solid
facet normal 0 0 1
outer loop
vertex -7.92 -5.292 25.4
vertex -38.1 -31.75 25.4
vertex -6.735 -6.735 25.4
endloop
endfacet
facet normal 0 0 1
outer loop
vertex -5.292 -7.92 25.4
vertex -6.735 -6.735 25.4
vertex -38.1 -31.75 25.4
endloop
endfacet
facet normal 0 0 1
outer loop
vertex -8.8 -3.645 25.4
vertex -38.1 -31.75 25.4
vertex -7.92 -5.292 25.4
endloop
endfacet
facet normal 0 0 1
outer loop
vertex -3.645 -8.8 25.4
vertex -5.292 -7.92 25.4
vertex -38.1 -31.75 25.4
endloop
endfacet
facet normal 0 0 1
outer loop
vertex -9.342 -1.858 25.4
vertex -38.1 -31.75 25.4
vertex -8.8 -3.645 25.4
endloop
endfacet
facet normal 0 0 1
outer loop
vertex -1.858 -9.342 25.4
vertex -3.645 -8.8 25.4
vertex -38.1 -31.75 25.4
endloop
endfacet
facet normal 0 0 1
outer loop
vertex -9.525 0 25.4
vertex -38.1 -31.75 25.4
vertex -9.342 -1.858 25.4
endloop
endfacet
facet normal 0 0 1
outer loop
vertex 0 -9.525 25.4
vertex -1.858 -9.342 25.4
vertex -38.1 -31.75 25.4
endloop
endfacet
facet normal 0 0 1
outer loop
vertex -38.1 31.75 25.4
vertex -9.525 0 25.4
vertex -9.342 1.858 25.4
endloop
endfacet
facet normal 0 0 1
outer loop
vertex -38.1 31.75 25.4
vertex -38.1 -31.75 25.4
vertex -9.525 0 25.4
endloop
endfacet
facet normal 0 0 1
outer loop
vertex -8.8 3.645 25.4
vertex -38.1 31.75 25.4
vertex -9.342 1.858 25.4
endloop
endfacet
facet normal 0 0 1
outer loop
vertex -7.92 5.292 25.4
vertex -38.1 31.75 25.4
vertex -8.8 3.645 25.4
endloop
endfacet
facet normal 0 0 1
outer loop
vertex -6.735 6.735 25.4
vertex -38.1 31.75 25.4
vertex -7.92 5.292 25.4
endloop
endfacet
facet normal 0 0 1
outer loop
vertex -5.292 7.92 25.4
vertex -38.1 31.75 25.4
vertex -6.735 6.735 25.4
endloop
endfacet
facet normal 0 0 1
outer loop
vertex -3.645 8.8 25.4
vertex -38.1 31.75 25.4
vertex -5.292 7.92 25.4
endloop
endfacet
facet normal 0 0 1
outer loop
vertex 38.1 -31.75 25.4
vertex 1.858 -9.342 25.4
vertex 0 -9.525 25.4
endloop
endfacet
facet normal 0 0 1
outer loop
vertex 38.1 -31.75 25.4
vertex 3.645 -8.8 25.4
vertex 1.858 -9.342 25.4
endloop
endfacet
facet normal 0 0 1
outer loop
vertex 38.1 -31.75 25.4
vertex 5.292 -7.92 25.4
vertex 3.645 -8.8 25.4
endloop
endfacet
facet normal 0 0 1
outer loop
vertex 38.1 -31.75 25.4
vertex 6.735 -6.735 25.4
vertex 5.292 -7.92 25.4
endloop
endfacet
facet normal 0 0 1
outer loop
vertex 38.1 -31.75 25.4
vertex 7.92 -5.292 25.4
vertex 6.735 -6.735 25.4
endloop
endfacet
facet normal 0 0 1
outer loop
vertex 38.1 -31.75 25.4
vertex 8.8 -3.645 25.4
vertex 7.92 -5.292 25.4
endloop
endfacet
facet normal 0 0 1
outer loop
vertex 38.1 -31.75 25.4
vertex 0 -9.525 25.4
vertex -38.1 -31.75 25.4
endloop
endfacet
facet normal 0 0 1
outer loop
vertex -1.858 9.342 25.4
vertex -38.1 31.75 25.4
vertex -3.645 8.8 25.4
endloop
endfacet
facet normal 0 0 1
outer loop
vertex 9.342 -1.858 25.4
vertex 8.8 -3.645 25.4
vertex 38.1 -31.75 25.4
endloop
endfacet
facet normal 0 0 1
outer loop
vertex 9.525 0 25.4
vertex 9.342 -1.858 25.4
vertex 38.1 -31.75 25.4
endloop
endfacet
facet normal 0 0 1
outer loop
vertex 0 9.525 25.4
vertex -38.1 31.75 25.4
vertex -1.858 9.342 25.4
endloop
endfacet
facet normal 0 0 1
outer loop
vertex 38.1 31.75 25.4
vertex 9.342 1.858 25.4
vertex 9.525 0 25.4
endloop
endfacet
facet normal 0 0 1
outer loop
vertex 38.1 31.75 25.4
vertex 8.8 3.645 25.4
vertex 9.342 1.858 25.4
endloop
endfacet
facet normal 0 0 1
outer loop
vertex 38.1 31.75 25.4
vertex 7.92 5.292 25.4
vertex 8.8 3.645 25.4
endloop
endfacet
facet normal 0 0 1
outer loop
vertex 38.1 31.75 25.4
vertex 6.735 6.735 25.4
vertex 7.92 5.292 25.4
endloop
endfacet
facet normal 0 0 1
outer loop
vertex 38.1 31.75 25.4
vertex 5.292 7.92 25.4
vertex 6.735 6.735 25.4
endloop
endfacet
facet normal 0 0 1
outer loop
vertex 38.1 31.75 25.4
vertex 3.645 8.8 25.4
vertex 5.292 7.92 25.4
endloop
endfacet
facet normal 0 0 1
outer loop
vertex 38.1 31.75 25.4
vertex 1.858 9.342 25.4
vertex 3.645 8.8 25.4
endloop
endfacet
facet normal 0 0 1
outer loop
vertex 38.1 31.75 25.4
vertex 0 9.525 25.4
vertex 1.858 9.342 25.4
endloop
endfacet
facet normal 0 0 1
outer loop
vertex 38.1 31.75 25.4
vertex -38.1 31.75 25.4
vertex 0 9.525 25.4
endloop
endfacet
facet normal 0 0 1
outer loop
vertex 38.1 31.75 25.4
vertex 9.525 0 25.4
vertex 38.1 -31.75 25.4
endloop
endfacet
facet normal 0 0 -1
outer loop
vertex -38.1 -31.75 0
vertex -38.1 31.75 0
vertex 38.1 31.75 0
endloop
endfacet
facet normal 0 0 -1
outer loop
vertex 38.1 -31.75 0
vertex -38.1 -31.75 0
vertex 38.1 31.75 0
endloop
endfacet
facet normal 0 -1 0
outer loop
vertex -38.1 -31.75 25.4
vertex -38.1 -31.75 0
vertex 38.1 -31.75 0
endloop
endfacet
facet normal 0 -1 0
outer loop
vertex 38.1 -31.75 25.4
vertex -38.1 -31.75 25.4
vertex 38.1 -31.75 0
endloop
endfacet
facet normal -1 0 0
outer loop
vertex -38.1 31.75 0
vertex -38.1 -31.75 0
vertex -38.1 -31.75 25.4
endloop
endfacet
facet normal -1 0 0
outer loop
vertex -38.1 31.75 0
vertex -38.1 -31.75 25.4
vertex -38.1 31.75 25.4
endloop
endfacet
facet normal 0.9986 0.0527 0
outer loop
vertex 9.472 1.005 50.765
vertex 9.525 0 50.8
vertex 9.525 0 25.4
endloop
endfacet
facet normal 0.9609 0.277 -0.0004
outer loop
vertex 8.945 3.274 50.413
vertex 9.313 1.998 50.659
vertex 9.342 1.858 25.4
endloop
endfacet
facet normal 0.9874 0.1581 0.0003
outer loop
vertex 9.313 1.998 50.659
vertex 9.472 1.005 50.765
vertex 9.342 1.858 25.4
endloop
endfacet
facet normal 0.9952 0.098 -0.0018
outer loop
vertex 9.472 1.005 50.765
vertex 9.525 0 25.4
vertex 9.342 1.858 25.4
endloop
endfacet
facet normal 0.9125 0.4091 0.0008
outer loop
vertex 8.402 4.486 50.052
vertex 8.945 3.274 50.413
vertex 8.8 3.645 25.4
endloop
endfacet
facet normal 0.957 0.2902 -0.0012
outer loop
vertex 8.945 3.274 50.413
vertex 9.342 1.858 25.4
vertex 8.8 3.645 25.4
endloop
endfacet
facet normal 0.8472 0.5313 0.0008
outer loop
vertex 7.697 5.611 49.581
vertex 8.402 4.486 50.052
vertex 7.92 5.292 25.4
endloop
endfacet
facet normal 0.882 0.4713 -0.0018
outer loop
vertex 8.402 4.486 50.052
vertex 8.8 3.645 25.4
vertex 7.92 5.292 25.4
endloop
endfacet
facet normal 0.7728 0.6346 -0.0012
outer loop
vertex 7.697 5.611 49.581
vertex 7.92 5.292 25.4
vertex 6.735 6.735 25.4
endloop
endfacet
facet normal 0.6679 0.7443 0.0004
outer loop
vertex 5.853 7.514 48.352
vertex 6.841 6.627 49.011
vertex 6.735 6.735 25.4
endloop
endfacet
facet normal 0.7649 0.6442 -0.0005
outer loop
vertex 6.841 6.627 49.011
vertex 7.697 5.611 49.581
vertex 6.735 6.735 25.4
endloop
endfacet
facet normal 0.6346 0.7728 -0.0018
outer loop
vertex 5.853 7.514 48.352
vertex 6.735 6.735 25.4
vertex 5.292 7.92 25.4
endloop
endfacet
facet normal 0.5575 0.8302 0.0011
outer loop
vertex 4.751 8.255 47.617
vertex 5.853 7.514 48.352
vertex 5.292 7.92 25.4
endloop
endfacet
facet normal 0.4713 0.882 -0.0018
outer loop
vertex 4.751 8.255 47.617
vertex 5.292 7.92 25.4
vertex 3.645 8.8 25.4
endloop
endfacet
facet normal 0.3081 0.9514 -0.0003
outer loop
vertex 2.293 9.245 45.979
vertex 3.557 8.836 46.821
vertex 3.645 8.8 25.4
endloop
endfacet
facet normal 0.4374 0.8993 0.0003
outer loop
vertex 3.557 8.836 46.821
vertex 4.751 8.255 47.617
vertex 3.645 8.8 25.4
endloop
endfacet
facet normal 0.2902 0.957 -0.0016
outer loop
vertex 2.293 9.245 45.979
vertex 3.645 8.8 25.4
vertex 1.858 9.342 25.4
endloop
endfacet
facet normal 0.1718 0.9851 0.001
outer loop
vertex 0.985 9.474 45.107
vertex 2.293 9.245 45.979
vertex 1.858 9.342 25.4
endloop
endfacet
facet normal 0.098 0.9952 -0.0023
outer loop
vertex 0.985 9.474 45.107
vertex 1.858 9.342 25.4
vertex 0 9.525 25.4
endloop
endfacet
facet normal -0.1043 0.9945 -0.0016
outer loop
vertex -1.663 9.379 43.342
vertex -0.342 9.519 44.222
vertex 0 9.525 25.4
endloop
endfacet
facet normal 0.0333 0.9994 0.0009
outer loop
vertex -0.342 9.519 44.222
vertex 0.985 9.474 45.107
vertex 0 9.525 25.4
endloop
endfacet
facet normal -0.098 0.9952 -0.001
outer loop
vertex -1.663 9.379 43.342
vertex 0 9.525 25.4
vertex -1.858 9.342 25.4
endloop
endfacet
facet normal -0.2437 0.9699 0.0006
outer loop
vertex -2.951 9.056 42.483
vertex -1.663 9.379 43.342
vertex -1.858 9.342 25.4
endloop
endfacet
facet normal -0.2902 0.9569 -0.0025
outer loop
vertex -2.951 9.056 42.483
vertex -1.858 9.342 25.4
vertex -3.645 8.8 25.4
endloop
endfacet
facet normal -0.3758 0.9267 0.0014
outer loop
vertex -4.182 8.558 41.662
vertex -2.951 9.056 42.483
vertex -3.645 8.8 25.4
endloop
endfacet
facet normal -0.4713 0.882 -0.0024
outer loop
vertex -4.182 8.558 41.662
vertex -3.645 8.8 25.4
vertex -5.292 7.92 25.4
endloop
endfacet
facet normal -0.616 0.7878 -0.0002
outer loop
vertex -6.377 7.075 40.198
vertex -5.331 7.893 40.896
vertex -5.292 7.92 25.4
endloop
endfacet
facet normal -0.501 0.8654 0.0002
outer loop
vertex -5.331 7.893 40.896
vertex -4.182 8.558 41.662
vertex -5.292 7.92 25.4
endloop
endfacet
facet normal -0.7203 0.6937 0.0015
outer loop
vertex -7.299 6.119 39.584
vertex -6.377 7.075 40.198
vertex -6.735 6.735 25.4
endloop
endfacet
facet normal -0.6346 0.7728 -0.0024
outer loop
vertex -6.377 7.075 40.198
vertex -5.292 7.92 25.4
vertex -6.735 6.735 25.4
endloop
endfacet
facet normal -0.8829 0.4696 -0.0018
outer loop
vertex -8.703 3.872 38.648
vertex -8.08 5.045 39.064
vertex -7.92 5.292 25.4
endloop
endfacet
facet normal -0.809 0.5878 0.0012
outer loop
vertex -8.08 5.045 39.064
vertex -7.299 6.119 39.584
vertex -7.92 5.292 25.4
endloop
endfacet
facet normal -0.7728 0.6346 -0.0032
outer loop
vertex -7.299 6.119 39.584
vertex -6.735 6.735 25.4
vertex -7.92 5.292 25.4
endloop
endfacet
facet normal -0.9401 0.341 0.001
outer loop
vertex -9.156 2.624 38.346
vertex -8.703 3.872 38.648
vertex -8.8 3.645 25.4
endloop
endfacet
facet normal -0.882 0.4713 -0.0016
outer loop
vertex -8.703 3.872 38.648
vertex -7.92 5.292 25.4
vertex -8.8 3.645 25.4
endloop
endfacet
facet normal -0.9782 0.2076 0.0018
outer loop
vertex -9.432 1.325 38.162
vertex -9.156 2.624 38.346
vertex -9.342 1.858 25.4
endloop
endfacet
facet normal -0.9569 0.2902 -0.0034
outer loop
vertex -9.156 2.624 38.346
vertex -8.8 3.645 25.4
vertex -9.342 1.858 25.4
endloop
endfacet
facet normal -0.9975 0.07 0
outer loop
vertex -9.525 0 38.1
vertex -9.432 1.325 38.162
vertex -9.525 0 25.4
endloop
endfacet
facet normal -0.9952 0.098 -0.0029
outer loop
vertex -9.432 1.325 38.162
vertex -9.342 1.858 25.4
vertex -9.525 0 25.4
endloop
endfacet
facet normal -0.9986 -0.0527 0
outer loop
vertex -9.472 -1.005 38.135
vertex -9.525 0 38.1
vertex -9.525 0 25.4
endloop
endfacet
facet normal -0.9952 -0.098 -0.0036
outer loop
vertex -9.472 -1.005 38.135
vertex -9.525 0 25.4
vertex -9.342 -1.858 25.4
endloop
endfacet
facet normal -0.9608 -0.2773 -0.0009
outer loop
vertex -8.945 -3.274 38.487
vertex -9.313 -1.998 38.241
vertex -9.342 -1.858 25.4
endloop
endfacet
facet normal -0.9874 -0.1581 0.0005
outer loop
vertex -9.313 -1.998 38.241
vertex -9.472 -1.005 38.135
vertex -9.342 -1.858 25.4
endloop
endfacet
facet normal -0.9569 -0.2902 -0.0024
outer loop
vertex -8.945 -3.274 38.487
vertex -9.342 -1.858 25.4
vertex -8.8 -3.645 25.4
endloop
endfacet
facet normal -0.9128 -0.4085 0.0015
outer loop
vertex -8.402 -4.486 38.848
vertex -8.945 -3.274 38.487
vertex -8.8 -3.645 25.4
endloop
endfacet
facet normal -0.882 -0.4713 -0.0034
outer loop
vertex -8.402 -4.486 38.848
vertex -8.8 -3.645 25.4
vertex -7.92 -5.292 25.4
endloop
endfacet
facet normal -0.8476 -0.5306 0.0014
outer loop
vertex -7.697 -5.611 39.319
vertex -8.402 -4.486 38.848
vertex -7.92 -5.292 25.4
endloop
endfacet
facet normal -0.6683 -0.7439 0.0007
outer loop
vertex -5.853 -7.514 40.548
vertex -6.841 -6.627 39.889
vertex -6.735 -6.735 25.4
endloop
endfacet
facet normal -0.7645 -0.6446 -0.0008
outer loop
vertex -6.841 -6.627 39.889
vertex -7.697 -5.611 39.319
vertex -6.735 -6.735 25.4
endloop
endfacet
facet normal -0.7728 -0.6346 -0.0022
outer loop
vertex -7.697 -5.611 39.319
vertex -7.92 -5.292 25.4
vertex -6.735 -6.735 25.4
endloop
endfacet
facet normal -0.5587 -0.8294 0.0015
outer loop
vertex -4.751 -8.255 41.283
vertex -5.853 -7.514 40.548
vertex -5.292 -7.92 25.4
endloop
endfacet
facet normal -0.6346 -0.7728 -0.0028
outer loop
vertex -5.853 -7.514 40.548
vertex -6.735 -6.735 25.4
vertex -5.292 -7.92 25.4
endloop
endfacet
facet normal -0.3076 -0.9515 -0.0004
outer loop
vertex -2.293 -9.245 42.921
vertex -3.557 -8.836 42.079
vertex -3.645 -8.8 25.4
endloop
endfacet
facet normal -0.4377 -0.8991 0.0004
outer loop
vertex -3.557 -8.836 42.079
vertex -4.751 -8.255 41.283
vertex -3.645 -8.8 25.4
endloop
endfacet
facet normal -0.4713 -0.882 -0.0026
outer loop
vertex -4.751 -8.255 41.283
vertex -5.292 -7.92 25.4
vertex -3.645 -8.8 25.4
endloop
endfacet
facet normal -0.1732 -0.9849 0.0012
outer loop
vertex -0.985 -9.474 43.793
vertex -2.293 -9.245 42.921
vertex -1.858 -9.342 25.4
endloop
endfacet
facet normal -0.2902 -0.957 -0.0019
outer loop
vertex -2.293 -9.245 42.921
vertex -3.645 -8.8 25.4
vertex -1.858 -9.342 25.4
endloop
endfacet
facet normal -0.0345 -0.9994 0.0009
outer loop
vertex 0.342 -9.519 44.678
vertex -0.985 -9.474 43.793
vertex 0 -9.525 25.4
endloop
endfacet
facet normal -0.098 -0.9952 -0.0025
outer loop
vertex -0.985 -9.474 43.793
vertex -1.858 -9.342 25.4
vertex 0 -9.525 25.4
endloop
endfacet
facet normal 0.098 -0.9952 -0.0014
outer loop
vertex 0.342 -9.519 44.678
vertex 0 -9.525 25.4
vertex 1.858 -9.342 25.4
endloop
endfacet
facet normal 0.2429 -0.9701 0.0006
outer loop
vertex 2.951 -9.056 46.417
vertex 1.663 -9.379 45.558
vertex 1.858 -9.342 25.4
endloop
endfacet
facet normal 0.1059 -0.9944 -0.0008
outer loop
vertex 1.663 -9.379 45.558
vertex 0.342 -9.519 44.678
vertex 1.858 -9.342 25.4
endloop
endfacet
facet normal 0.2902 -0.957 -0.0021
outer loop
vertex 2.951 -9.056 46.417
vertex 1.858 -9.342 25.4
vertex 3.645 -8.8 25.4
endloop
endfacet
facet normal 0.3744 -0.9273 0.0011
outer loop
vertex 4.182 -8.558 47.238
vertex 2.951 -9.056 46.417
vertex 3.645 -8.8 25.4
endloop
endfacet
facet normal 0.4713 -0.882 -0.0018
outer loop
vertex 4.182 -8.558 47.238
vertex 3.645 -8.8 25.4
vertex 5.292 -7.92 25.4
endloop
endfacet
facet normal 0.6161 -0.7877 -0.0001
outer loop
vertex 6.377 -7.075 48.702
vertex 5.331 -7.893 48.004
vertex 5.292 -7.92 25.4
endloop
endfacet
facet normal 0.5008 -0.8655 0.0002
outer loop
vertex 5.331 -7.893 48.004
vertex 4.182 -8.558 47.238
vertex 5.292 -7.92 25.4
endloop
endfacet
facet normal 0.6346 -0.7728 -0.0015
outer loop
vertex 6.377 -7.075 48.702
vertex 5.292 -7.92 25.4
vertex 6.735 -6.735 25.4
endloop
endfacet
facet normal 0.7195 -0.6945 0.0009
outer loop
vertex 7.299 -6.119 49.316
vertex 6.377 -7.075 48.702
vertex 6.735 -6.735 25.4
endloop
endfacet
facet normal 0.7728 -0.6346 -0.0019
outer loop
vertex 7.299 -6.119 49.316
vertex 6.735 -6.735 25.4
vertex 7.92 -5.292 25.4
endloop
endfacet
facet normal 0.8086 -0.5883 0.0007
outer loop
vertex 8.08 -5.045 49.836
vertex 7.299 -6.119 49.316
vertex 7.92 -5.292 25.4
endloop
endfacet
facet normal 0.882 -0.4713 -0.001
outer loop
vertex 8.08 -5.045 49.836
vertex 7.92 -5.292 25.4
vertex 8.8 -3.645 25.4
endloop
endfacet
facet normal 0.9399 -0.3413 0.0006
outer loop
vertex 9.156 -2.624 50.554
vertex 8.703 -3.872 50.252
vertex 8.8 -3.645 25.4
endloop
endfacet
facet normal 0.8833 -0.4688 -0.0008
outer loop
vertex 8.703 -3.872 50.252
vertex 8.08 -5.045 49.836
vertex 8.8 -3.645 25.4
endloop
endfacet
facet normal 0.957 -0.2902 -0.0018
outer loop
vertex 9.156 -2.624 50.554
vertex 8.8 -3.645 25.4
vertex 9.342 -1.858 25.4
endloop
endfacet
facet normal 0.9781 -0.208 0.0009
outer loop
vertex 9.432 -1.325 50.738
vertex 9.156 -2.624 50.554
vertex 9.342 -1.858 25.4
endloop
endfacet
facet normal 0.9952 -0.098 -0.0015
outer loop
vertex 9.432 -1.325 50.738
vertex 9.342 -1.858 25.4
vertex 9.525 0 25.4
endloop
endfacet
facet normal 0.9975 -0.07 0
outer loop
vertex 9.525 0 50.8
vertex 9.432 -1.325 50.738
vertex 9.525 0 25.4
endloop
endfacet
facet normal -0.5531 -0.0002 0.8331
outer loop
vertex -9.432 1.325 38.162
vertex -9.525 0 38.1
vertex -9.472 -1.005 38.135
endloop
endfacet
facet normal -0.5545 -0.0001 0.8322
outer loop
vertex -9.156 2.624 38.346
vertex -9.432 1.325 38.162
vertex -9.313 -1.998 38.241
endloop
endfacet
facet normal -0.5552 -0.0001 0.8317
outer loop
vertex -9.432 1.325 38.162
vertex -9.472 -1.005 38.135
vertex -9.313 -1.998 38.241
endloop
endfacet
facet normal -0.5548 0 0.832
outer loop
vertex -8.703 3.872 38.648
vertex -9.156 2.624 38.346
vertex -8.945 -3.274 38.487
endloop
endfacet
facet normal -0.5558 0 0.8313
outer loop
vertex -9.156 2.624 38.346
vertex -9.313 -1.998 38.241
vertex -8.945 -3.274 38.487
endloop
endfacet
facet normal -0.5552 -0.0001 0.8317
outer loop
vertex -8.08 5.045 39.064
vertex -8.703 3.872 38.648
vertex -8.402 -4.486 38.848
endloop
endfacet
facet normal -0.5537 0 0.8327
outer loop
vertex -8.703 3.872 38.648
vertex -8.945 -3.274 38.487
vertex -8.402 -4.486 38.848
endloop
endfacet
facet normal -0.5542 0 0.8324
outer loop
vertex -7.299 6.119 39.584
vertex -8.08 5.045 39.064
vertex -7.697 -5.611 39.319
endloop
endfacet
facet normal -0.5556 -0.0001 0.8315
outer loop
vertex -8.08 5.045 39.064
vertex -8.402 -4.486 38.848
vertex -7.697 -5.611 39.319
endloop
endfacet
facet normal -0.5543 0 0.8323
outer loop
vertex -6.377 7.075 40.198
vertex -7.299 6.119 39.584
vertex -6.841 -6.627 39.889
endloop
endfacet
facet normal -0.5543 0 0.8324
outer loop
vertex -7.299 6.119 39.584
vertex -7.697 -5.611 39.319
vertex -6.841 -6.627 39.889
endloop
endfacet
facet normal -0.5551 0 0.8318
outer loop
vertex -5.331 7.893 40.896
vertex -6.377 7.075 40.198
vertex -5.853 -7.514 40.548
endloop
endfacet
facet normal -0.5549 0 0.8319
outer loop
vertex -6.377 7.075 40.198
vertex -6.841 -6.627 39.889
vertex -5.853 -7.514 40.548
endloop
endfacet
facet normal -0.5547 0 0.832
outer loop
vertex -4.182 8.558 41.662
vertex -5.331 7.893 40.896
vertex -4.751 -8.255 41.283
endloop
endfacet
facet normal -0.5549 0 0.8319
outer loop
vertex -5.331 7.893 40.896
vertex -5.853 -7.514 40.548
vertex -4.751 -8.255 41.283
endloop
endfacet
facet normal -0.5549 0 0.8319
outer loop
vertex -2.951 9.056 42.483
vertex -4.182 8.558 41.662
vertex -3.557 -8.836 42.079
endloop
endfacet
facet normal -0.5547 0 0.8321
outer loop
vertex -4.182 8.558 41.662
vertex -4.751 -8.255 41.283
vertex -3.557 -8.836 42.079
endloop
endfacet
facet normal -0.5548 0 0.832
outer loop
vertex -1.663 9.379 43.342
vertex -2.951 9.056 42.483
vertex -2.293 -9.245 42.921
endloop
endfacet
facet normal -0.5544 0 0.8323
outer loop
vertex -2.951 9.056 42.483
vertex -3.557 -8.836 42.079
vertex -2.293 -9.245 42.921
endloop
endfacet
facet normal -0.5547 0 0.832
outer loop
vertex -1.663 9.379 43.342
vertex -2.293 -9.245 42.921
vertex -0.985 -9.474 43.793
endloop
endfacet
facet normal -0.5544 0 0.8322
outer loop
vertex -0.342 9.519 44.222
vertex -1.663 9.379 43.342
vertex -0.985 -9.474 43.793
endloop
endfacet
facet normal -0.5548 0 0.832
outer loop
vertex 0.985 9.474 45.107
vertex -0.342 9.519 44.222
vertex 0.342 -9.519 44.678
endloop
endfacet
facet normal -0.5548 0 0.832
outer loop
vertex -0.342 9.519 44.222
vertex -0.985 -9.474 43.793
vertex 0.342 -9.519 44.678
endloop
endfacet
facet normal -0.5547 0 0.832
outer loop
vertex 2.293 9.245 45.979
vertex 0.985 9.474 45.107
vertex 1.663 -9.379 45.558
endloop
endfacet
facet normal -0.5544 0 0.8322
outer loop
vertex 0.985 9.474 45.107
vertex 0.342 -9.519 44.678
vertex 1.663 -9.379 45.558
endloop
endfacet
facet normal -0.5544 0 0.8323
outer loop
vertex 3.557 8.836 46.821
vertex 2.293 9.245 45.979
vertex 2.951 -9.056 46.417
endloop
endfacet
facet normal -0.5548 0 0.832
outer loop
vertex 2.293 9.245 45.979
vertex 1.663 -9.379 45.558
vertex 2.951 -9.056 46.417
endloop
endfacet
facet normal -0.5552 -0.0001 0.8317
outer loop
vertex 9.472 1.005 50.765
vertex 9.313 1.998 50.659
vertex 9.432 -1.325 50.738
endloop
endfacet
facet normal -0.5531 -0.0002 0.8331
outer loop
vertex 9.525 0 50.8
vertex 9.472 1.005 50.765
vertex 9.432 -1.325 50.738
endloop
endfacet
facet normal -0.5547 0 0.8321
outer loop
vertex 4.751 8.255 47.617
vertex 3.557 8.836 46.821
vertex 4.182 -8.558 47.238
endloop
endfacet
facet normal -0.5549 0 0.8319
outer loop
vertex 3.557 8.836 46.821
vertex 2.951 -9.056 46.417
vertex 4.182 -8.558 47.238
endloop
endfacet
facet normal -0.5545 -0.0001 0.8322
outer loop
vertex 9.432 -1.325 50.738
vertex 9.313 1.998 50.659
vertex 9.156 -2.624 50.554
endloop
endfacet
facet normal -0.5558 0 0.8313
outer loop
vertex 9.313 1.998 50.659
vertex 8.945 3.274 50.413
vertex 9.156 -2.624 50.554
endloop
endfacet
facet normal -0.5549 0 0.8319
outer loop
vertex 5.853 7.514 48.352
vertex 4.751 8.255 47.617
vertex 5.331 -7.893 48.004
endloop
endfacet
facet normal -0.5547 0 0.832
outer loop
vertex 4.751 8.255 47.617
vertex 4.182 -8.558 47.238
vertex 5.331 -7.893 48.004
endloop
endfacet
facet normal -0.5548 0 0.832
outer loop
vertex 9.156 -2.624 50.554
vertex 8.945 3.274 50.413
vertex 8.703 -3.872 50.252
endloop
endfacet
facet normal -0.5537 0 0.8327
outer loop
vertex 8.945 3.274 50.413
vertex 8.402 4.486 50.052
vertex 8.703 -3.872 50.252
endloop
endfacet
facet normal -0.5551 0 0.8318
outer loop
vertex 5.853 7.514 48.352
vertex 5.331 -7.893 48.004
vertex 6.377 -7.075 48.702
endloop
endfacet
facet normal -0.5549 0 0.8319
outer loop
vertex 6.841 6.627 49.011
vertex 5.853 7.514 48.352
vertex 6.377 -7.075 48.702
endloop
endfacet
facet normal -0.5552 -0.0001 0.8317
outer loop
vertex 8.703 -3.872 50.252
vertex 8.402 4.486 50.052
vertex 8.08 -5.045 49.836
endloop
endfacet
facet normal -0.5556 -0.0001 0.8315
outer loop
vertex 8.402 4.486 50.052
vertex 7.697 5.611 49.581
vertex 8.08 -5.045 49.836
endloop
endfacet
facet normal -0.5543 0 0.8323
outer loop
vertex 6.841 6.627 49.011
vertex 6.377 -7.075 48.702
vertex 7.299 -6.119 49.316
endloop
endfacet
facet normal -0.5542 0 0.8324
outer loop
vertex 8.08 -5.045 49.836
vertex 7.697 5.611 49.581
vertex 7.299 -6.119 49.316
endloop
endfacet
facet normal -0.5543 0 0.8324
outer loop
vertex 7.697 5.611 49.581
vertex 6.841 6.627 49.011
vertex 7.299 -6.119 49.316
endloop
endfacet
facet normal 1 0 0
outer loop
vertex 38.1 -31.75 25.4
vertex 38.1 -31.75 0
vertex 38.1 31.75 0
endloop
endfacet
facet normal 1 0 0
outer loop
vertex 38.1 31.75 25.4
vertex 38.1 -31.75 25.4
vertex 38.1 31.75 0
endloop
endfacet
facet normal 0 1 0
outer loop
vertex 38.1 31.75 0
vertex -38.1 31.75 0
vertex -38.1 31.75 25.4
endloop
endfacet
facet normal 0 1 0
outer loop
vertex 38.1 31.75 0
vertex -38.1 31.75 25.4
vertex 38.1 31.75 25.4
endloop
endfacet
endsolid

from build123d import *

# Parameters (mm, degrees)
F0_W     = 76.2
F0_H     = 63.5
F1_DEPTH = 25.4
F2_R     = 9.525
F3_DEPTH = 25.4
F5_DEPTH = 19.05


with BuildPart() as f1:
    # F0 (on Top) → F1 (new body)
    with BuildSketch(Plane.XY):
        Rectangle(F0_W, F0_H)
    extrude(amount=F1_DEPTH)

    # F2 (on face) → F3 (join)
    with BuildSketch(Plane.XY.offset(25.4)):
        Circle(F2_R)
    extrude(amount=F3_DEPTH)

    # F4 (on Front) → F5 (cut, symmetric)
    with BuildSketch(Plane.XZ):
        Polygon((9.525, 50.8), (-9.525, 50.8), (-9.525, 38.1), align=None)
    extrude(amount=F5_DEPTH, both=True, mode=Mode.SUBTRACT)


solid = f1.part
